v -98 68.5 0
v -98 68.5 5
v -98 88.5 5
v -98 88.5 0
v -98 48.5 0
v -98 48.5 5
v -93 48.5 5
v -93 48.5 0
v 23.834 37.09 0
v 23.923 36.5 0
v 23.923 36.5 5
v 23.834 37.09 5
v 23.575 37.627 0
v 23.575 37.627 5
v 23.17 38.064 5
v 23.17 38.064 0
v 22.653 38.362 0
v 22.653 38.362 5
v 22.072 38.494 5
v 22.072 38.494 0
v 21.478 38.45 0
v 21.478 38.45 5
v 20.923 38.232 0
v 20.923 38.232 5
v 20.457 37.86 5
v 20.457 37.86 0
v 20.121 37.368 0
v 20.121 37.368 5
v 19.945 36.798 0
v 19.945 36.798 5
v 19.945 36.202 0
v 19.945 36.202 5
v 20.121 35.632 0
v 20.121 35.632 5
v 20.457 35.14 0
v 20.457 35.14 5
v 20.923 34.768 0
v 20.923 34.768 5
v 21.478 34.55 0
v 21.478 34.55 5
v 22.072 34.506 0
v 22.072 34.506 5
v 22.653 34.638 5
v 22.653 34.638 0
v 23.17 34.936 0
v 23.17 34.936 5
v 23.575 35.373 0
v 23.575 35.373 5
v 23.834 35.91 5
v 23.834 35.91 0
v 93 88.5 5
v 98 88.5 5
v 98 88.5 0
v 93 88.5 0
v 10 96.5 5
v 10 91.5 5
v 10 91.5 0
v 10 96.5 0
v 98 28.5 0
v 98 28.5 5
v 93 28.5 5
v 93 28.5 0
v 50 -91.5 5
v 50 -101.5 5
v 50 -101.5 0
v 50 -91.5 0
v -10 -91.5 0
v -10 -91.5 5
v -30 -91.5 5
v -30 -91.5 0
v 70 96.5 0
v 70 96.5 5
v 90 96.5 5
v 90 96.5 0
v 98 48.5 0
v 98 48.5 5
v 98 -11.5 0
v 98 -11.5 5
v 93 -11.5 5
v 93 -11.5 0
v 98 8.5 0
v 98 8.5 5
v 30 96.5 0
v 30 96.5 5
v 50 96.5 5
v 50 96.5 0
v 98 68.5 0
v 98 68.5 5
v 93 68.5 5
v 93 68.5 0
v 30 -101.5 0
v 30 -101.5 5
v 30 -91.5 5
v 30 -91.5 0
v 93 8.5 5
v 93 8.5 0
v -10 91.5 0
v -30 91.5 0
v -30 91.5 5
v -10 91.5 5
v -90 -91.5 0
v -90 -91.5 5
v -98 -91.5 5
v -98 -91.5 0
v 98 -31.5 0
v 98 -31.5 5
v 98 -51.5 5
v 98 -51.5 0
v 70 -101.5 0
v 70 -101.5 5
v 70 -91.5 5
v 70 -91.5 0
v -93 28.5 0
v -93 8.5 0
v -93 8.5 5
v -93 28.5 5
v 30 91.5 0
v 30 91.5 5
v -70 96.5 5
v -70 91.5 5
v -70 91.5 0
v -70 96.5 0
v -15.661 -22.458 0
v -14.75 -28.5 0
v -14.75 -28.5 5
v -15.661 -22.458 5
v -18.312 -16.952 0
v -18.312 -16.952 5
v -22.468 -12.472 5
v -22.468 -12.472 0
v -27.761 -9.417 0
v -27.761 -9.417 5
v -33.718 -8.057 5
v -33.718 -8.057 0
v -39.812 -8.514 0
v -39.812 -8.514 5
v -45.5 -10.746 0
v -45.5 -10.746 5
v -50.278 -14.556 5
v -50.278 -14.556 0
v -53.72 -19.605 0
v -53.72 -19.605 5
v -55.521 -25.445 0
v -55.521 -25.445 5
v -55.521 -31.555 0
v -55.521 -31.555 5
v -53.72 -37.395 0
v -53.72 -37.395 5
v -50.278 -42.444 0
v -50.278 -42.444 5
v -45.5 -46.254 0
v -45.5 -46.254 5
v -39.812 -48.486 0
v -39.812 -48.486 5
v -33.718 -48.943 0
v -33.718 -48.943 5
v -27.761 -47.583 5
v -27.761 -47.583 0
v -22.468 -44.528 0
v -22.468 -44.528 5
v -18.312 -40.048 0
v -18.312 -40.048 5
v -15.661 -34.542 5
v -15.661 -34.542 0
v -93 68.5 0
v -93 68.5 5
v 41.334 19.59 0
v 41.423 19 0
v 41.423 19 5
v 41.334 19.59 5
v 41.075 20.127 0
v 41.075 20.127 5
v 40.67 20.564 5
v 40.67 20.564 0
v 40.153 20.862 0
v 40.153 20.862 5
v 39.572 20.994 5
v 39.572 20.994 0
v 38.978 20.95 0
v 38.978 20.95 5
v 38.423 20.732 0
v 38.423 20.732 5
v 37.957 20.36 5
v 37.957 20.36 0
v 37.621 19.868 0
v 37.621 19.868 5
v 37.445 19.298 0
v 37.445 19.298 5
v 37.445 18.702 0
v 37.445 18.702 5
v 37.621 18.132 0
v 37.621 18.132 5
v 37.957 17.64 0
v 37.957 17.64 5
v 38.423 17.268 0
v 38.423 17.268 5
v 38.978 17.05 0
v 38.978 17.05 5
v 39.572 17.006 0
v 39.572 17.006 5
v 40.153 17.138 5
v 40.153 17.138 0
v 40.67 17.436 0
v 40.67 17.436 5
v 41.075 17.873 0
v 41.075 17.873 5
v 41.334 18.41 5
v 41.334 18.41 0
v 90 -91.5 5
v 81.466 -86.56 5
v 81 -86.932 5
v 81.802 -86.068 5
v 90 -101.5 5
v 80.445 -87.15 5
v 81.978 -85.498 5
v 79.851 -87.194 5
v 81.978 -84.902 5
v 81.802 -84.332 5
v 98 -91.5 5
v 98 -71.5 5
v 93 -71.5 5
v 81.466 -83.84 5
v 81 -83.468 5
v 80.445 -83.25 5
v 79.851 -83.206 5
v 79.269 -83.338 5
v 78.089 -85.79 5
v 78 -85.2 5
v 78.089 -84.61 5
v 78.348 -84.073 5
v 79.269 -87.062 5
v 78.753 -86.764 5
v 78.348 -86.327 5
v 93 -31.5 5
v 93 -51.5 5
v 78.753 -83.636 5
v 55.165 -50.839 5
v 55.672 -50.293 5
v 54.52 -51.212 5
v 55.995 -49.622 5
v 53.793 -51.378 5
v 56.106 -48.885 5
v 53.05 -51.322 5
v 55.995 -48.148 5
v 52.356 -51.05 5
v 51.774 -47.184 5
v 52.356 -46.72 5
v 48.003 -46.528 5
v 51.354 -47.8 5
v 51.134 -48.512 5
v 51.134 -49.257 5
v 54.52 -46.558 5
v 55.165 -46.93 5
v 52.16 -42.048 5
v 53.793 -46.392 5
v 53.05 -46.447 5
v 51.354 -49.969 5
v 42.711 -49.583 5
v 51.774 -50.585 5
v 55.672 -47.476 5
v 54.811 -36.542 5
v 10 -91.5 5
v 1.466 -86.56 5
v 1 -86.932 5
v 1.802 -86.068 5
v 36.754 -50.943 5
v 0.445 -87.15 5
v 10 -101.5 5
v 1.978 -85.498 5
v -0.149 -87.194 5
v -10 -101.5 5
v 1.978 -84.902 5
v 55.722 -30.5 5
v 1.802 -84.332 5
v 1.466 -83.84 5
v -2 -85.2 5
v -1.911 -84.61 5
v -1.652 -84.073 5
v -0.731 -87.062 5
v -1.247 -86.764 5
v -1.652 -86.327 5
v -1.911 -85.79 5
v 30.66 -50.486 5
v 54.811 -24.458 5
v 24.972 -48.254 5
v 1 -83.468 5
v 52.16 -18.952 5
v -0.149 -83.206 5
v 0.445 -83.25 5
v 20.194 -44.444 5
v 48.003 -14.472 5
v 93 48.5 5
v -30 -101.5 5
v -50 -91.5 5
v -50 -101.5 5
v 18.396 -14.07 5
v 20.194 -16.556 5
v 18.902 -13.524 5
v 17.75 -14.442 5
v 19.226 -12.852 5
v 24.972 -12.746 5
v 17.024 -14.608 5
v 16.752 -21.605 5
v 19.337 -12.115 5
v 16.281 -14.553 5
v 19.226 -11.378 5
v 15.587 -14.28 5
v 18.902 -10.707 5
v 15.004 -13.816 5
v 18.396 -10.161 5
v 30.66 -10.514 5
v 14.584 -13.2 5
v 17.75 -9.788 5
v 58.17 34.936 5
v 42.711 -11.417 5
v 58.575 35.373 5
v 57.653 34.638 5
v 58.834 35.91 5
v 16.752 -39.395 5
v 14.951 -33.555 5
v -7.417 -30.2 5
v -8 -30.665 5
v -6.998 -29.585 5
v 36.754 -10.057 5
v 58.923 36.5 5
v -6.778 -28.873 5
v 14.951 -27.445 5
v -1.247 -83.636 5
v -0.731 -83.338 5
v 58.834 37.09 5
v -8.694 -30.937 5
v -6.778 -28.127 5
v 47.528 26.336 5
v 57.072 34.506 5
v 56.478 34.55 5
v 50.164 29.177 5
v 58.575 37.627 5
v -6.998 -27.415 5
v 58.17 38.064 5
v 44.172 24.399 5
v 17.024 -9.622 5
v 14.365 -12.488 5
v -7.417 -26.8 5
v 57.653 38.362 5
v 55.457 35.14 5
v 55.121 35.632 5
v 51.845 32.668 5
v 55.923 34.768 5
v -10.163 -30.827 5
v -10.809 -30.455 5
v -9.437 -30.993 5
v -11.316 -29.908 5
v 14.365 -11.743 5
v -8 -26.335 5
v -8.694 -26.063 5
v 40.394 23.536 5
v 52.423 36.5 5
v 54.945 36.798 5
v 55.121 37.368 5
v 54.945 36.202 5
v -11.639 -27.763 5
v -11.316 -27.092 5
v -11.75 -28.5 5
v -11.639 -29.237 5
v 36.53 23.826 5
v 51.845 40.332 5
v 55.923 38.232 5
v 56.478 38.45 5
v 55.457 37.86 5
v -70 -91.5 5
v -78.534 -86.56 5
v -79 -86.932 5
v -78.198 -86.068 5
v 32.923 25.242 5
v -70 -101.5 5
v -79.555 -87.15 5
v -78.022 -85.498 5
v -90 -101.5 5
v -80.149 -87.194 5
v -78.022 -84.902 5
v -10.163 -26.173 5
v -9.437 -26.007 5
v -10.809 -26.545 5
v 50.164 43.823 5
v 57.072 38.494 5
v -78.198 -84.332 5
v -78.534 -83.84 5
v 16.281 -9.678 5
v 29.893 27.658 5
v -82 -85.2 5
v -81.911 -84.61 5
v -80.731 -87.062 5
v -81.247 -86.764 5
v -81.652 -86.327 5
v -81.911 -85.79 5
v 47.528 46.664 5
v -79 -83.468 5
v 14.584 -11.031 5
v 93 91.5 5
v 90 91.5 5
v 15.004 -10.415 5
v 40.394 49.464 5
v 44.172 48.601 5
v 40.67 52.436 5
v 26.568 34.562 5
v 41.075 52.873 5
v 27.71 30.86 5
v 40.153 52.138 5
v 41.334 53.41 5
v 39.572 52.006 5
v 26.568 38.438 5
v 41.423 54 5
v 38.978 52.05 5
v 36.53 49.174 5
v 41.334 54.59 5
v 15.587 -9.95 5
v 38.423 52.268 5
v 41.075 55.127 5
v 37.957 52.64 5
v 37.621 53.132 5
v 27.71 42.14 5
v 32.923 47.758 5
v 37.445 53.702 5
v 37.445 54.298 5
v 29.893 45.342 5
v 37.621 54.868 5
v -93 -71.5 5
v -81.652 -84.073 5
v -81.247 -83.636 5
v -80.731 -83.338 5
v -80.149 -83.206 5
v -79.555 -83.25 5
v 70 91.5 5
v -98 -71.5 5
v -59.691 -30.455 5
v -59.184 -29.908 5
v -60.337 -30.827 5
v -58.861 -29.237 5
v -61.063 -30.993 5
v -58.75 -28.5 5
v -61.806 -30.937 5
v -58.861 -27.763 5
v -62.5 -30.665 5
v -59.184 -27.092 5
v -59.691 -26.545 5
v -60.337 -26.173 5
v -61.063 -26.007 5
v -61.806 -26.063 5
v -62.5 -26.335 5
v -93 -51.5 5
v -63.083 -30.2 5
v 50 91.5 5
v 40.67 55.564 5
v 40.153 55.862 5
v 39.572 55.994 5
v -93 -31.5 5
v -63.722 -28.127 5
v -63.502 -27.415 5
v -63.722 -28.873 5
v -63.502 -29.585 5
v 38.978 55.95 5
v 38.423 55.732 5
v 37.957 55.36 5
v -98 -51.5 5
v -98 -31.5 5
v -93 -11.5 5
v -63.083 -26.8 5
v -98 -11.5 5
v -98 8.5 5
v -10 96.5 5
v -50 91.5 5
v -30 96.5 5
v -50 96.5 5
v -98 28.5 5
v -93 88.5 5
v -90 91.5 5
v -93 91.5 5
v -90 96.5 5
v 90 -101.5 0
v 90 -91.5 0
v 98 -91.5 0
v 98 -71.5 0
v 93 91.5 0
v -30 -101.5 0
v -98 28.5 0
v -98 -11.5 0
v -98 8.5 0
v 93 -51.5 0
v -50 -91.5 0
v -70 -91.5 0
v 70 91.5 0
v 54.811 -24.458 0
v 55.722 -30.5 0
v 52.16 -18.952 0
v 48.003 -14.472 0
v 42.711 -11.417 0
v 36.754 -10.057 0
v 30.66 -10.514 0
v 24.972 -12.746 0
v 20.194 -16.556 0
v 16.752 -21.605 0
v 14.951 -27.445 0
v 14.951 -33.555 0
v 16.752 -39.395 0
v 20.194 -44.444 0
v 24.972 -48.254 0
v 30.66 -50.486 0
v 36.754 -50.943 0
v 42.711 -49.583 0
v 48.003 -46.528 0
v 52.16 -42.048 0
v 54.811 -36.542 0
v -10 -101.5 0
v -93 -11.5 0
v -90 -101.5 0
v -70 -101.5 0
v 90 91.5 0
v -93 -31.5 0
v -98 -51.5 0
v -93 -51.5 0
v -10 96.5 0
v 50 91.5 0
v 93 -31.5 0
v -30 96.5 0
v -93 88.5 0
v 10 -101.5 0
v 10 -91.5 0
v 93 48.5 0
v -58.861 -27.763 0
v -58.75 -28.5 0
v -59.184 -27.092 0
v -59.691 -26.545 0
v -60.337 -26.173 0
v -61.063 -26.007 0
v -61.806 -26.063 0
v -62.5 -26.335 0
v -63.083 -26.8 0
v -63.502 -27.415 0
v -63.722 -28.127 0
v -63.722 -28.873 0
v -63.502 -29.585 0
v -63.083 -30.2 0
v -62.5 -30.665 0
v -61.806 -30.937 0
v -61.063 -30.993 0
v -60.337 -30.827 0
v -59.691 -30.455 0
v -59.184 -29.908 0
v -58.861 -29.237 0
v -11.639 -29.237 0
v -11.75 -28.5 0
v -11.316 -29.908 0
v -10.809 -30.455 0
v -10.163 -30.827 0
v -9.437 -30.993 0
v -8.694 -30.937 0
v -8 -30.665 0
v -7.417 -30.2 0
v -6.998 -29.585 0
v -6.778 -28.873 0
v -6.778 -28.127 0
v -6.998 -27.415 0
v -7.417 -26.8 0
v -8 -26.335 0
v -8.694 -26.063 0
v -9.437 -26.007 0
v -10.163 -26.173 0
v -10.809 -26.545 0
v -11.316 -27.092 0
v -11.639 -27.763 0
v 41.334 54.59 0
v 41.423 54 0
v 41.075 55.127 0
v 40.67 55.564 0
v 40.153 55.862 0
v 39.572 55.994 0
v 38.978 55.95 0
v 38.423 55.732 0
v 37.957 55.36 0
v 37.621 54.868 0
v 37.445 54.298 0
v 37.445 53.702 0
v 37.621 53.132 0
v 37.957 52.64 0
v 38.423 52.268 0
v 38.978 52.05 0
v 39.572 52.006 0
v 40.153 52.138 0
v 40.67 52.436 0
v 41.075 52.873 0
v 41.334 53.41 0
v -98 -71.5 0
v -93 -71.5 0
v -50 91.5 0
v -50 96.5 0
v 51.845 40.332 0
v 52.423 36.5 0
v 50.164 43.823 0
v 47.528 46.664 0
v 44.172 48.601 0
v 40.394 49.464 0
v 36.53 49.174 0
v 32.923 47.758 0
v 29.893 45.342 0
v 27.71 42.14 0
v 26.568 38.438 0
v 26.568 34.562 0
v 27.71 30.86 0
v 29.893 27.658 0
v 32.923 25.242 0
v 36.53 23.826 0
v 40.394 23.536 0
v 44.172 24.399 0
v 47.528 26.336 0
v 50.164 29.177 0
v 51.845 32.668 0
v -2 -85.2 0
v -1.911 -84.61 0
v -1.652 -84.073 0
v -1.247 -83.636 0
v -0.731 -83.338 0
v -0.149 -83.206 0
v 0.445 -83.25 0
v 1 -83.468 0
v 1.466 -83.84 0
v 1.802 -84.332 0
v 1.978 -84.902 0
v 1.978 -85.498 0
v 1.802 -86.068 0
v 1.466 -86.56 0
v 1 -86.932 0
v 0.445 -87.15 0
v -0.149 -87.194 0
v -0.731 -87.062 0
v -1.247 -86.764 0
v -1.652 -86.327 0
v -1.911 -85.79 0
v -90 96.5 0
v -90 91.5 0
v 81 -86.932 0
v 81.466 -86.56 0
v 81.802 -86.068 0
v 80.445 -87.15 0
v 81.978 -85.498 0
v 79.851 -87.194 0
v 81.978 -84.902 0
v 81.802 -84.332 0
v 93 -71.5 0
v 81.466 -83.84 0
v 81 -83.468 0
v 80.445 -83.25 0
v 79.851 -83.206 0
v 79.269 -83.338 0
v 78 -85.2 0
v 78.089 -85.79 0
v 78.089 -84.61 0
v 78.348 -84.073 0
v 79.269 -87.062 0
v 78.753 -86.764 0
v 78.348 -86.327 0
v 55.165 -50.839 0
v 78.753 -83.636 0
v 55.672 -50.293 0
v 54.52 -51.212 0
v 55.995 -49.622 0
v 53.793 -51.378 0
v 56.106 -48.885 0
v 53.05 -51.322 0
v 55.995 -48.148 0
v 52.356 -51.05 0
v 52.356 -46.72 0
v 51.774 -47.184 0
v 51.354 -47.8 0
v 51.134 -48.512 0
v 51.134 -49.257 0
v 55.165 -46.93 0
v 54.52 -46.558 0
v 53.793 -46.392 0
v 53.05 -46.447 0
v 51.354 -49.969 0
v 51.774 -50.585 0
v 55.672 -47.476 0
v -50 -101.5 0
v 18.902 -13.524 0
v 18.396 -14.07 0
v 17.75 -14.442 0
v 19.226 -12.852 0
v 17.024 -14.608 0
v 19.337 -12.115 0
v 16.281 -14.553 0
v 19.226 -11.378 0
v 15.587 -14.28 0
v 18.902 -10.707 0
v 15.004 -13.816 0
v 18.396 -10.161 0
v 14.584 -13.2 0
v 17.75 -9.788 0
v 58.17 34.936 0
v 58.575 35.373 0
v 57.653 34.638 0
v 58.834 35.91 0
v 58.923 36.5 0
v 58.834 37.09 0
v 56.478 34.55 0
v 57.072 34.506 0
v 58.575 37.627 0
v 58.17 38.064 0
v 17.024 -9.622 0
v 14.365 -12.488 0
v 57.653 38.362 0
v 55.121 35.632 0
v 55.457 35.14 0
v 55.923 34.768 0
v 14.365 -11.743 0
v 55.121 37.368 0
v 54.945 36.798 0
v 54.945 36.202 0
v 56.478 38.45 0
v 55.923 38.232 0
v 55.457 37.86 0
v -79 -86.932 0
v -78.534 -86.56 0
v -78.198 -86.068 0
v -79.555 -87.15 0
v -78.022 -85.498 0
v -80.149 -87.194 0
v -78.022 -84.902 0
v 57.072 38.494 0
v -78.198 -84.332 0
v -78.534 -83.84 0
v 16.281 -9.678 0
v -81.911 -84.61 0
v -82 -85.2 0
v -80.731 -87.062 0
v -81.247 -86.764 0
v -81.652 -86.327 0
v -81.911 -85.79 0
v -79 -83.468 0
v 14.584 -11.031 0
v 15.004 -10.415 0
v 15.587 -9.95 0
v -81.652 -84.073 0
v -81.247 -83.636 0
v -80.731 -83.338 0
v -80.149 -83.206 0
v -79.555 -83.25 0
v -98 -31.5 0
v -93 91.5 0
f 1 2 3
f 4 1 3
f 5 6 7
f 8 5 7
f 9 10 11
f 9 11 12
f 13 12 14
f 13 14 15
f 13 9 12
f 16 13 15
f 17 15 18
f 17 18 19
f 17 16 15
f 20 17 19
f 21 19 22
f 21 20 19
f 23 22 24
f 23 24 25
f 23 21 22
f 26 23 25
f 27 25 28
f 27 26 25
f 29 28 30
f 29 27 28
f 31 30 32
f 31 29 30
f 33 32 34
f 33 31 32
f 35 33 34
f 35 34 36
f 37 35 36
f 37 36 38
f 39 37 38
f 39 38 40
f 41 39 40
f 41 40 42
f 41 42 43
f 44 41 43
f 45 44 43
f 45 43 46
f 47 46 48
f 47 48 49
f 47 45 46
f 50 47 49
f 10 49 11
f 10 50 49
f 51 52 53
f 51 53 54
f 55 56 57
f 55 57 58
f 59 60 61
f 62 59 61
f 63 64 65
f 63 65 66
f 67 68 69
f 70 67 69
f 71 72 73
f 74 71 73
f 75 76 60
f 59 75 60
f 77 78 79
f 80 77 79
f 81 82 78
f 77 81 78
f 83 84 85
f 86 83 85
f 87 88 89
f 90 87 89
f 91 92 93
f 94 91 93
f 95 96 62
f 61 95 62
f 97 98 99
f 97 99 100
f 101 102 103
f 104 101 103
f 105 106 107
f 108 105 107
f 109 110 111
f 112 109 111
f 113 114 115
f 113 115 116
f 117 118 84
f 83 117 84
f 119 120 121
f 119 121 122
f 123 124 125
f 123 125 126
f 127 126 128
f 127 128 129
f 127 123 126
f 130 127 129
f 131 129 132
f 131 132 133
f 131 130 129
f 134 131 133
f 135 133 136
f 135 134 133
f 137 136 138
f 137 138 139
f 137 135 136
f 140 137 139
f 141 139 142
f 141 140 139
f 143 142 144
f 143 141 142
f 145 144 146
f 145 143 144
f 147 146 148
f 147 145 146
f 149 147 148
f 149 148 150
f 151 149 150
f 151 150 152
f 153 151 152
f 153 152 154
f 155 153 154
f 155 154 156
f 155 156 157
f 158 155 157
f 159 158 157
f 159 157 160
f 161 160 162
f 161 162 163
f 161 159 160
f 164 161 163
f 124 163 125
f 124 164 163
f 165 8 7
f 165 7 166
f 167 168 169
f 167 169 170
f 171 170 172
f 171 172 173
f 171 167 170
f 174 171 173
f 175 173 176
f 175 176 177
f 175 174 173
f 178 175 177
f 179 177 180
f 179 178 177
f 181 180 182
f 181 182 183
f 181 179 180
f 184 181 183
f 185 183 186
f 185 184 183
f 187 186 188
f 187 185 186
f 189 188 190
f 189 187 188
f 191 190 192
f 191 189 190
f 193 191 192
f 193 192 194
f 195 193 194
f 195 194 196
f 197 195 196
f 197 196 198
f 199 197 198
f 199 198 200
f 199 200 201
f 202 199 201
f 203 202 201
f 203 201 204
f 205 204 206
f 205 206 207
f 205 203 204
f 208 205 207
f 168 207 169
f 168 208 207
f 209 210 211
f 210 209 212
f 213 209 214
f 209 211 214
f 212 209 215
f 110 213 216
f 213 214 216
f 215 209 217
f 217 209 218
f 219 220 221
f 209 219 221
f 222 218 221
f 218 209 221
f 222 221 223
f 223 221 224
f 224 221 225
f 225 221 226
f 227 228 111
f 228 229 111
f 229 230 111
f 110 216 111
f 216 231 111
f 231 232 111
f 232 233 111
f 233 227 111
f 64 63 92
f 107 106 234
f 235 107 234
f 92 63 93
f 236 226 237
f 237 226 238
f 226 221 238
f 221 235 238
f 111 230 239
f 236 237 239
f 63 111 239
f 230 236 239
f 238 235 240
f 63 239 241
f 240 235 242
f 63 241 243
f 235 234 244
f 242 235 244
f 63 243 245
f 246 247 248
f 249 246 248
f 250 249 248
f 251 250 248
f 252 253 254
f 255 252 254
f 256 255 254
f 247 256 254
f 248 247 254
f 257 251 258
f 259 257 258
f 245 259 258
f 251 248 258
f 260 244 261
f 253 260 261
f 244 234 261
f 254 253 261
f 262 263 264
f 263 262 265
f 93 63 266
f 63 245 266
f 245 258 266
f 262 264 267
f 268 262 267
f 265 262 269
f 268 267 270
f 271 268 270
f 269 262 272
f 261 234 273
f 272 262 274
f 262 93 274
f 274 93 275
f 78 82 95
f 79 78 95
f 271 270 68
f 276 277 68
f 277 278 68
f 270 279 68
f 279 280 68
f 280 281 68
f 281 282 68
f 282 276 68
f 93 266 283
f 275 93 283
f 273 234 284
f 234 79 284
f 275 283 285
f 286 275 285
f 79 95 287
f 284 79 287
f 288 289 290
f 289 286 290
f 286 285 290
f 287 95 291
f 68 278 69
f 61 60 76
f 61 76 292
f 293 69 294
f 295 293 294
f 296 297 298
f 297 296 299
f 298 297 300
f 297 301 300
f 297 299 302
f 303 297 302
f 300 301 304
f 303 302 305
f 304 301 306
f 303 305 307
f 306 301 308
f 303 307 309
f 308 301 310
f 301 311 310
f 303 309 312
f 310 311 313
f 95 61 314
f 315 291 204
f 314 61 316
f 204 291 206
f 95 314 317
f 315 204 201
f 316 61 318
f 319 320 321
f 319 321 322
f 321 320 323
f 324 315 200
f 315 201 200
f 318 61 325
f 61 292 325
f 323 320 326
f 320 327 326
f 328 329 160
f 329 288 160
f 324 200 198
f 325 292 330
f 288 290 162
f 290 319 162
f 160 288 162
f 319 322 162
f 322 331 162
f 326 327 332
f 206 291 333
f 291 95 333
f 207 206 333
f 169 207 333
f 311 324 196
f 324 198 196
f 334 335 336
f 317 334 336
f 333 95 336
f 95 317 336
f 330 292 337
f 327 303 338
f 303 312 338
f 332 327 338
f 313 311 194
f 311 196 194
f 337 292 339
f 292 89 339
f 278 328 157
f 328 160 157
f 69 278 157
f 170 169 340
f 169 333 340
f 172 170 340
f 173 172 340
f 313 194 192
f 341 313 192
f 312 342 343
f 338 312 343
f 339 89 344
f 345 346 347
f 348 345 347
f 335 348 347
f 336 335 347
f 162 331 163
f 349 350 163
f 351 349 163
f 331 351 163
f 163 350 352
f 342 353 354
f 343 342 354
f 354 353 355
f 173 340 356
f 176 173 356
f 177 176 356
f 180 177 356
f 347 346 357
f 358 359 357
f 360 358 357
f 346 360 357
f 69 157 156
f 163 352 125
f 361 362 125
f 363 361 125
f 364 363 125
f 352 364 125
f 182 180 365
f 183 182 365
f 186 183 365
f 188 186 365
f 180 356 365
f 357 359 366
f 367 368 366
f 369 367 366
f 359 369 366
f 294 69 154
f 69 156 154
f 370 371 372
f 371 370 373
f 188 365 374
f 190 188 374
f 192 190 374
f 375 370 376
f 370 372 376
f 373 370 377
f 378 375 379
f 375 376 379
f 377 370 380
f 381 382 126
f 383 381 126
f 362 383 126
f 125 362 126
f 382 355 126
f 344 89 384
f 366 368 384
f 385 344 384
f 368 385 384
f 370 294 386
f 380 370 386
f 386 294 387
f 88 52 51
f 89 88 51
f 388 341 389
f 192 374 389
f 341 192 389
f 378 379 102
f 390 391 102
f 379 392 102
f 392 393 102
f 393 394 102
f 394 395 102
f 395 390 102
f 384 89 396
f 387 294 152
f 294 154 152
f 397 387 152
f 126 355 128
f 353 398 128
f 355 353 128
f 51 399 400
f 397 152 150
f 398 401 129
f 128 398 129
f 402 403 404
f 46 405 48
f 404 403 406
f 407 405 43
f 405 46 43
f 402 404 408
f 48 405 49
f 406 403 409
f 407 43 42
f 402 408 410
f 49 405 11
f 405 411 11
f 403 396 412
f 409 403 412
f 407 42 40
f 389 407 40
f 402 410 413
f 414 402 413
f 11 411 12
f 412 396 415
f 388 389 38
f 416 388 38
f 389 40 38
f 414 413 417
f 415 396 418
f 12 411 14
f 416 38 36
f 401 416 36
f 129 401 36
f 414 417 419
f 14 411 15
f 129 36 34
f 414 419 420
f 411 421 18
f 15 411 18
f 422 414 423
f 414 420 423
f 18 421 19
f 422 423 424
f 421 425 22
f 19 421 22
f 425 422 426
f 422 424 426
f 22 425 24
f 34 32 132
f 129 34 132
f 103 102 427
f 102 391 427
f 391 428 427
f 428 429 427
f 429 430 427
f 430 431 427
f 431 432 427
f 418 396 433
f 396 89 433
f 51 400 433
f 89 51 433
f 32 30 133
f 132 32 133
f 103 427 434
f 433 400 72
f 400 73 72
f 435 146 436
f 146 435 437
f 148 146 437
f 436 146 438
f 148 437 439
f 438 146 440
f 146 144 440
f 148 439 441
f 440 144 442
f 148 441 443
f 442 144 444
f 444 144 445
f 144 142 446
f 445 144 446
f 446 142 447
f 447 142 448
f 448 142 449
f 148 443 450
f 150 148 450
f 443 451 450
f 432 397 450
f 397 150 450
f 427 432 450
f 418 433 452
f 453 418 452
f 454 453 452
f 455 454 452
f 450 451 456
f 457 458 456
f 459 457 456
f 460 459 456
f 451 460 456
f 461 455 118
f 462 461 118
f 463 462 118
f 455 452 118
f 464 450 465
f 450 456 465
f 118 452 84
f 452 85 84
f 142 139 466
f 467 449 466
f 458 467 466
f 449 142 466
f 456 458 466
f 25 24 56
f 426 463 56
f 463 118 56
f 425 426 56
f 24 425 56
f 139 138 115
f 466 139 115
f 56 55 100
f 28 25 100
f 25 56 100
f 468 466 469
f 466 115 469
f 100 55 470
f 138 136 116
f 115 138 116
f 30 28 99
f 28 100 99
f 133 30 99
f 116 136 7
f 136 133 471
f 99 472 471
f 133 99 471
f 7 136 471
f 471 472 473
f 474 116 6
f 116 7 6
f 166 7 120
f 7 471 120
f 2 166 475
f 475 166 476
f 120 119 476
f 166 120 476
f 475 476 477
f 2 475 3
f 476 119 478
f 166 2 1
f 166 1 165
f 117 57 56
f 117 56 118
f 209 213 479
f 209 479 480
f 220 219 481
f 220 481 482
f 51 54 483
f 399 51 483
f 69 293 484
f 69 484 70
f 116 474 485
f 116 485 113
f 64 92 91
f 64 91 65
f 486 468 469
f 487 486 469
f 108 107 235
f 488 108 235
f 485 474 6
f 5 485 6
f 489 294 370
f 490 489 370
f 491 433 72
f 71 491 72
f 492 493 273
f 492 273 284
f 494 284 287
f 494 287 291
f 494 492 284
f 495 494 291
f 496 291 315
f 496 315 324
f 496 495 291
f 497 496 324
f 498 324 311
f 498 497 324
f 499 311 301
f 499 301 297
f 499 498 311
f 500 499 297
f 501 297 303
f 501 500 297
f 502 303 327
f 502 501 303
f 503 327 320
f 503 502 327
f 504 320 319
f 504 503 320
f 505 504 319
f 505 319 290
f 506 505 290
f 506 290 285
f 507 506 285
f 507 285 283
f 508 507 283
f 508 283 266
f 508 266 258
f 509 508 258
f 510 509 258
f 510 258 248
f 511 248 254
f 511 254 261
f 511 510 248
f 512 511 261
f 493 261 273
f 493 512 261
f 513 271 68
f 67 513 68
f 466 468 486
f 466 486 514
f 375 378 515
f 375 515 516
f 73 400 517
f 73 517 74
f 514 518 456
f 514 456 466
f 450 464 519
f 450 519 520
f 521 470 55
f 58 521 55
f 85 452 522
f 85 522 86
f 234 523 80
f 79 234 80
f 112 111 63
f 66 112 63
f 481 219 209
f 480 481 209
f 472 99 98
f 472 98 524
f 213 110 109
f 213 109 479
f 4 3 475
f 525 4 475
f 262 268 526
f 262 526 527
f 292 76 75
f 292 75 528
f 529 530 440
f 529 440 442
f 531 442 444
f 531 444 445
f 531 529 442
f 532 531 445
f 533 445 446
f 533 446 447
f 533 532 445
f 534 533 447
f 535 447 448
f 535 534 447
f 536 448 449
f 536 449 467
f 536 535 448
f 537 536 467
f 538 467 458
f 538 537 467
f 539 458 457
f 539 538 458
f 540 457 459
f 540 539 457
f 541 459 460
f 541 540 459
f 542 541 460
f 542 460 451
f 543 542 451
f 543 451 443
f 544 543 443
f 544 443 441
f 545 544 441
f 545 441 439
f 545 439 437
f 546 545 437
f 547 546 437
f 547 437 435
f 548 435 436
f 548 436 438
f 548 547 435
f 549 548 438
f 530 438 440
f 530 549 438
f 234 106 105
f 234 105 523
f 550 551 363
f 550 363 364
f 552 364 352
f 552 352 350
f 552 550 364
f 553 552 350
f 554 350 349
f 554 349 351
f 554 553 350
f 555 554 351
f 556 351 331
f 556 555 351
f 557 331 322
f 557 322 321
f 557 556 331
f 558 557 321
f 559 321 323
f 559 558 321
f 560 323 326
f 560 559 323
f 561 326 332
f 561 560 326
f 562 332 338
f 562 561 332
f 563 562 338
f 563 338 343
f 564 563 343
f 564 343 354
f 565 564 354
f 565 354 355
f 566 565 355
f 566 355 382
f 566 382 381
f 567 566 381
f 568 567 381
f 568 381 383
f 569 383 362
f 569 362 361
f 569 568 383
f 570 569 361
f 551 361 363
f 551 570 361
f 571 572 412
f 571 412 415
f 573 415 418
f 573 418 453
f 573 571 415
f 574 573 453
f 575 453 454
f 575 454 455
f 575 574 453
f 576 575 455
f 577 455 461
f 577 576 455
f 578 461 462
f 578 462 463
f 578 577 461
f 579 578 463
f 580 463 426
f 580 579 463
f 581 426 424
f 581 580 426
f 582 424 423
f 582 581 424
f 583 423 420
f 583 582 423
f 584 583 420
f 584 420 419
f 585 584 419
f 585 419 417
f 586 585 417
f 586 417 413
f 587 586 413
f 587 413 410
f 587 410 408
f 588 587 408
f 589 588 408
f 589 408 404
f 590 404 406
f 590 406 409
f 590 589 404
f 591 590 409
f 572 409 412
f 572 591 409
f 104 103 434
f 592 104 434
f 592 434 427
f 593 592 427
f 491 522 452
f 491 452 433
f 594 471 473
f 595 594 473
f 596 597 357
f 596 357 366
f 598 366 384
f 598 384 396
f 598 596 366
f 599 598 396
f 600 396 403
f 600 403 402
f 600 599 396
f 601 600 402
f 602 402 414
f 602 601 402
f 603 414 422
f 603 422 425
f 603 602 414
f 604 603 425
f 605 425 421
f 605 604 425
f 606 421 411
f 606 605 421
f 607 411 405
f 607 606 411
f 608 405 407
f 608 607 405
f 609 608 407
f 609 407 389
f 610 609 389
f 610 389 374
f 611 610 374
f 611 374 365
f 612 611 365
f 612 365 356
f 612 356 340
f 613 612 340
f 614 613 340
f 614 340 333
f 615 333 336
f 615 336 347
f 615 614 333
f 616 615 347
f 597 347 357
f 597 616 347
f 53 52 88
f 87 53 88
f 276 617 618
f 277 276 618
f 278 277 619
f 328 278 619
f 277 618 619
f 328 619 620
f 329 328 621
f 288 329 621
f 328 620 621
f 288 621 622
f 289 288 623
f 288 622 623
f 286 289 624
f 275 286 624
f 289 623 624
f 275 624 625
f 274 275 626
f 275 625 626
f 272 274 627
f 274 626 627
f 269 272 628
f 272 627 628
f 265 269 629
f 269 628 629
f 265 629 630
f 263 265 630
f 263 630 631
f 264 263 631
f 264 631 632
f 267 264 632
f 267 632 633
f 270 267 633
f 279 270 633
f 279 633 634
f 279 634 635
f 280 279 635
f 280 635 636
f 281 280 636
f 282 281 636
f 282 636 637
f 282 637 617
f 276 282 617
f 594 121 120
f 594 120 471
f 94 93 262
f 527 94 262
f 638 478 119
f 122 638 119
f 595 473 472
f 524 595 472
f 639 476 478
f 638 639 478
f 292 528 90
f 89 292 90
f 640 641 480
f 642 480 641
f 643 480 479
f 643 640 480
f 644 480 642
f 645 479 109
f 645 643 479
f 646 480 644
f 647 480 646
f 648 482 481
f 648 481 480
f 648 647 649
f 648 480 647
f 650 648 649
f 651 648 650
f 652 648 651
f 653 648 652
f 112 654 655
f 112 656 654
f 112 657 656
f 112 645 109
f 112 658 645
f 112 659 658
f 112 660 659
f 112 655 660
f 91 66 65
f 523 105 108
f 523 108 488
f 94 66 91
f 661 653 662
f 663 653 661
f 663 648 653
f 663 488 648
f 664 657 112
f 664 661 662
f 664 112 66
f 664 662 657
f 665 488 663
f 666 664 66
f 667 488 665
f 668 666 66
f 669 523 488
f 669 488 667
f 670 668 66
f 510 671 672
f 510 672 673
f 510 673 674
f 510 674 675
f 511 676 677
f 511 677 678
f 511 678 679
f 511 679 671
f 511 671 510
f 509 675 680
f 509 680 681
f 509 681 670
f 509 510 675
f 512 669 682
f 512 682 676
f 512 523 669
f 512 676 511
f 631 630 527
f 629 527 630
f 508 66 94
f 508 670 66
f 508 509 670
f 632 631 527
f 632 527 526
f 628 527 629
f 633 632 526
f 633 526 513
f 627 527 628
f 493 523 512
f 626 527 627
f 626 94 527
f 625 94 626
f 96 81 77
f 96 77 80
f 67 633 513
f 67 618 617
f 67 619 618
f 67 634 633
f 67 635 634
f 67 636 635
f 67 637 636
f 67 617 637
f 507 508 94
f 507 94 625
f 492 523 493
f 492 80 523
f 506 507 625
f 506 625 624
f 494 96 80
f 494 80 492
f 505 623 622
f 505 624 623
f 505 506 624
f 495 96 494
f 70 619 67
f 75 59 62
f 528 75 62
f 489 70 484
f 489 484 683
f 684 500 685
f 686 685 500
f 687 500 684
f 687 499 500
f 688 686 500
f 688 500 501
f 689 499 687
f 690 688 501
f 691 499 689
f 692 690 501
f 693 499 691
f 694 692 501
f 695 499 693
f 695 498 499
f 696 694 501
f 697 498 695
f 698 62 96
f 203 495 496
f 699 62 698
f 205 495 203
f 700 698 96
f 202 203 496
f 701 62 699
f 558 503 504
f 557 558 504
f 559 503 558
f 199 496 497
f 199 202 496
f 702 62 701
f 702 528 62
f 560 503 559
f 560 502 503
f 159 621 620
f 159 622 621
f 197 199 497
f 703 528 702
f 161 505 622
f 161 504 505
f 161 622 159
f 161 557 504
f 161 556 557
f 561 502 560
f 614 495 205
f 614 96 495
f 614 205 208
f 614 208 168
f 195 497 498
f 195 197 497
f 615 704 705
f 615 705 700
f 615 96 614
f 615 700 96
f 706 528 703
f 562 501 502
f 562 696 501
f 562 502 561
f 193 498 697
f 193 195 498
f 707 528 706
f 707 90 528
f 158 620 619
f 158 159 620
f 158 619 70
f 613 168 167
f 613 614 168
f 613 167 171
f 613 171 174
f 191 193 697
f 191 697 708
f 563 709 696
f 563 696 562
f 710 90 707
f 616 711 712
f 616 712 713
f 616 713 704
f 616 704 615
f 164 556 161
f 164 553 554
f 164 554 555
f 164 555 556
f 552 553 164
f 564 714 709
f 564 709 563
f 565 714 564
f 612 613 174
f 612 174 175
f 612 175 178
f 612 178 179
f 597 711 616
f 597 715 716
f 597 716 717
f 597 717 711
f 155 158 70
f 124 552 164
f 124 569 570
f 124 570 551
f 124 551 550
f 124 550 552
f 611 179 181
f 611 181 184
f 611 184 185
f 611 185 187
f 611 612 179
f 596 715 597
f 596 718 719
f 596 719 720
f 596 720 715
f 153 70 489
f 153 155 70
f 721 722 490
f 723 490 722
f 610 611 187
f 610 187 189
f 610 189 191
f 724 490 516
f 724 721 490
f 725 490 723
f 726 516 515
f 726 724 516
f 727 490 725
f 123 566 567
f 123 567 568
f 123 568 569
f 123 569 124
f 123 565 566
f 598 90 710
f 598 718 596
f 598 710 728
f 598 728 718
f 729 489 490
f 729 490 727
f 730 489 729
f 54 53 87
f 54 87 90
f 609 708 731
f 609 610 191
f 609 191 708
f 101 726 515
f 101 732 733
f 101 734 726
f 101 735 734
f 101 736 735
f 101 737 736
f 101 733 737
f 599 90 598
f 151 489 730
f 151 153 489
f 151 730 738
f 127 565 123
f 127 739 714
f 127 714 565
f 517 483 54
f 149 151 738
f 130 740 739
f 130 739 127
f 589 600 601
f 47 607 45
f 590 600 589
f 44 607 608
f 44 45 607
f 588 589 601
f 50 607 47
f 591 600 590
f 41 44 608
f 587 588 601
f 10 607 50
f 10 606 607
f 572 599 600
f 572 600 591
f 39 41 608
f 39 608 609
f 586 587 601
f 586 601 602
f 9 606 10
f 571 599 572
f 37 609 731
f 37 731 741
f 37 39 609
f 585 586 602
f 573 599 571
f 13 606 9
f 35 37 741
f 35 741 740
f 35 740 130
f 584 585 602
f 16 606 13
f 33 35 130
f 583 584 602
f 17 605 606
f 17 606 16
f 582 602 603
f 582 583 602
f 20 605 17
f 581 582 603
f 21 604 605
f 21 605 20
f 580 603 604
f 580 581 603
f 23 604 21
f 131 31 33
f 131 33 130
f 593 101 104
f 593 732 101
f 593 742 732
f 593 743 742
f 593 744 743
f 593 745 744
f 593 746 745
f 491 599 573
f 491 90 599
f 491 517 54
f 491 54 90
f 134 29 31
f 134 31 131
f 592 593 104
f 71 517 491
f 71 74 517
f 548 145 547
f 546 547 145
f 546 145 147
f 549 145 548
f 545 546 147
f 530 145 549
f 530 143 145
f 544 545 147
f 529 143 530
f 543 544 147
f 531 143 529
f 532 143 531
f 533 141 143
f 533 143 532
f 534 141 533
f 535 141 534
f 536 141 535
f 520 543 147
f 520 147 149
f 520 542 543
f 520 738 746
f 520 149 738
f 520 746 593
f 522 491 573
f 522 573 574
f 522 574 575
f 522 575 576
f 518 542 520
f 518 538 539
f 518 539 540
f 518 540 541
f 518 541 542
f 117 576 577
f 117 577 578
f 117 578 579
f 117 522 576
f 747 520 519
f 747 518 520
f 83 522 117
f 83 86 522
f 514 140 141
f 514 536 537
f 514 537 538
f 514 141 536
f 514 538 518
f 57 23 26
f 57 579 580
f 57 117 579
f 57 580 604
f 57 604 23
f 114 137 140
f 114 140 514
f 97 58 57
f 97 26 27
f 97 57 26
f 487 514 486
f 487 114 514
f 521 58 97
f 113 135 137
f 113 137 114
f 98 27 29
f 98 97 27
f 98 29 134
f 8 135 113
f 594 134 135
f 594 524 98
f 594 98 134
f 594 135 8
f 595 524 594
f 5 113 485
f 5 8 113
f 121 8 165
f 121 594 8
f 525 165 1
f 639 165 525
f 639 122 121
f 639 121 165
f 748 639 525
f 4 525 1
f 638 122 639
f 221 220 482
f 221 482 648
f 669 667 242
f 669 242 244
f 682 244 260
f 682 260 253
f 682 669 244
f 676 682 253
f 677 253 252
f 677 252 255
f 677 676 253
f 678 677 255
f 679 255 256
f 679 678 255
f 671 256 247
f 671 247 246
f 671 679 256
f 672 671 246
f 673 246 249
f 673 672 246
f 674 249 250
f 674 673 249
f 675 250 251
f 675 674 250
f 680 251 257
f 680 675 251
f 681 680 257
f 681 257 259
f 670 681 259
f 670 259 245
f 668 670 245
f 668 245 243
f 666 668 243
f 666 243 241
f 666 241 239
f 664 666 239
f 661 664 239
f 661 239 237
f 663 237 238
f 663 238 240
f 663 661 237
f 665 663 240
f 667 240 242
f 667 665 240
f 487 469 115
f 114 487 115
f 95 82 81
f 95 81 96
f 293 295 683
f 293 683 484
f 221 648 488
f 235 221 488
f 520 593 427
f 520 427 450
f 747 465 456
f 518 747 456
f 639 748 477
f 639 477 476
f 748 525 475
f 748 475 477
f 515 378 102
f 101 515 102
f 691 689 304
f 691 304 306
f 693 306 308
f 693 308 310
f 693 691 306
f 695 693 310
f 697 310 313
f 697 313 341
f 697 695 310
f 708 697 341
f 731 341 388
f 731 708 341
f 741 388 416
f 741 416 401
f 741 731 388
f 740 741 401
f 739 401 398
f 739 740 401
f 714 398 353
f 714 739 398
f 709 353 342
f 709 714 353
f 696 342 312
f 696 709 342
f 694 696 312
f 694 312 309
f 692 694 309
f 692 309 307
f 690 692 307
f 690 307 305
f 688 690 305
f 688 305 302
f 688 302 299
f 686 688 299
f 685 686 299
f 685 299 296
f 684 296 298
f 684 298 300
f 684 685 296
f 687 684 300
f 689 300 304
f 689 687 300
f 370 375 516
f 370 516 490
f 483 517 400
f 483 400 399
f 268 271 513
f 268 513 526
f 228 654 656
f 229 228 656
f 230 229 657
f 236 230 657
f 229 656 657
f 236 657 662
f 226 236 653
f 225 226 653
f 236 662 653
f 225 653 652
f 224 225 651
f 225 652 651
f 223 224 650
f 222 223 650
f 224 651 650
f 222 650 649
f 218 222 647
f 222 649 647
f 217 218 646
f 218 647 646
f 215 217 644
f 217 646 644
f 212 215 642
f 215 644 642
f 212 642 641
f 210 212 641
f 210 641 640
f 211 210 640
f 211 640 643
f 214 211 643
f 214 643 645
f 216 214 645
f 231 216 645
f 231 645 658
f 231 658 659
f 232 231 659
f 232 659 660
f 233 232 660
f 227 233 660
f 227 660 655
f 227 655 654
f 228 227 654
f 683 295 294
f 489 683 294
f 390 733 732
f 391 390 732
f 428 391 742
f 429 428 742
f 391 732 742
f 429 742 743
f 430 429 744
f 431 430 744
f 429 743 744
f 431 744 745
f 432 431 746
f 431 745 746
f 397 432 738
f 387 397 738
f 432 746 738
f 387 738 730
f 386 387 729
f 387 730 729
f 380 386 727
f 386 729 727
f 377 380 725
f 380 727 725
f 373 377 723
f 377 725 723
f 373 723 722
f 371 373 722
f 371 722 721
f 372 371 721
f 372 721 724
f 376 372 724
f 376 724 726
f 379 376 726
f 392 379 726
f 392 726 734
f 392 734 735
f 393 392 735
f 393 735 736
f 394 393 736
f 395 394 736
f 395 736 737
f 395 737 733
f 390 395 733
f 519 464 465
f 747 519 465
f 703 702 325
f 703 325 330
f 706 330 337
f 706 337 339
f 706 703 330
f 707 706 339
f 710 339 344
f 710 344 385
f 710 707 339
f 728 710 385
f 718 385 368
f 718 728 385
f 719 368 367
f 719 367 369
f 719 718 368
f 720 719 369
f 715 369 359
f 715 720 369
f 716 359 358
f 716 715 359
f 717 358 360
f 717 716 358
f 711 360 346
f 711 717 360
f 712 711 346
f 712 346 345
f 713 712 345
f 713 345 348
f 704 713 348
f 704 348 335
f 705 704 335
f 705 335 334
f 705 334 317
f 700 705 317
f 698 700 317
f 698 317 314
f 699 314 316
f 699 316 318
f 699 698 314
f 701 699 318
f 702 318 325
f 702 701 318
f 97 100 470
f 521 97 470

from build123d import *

# Parameters (mm, degrees)
SKETCH_1_W                       = 186
SKETCH_1_H                       = 183
SKETCH_1_R                       = 20.5
SKETCH_1_R_2                     = 2.5
SKETCH_1_R_3                     = 2
SKETCH_1_R_4                     = 13
EXTRUDE_1_DEPTH                  = 5
SKETCH_2_W                       = 5
SKETCH_2_H                       = 20
EXTRUDE_2_DEPTH                  = 5
PATTERN_LINEAR_1_COUNT           = 5
PATTERN_LINEAR_1_PITCH           = 40
MIRROR_1_COPY_1_SKETCH_W         = 5
MIRROR_1_COPY_1_SKETCH_H         = 20
MIRROR_1_COPY_1_DEPTH            = 5
MIRROR_1_COPY_2_SKETCH_W         = 5
MIRROR_1_COPY_2_SKETCH_H         = 20
MIRROR_1_COPY_2_DEPTH            = 5
MIRROR_1_COPY_3_SKETCH_W         = 5
MIRROR_1_COPY_3_SKETCH_H         = 20
MIRROR_1_COPY_3_DEPTH            = 5
MIRROR_1_COPY_4_SKETCH_W         = 5
MIRROR_1_COPY_4_SKETCH_H         = 20
MIRROR_1_COPY_4_DEPTH            = 5
SKETCH_3_W                       = 20
SKETCH_3_H                       = 5
EXTRUDE_3_DEPTH                  = 5
PATTERN_LINEAR_2_COUNT           = 3
PATTERN_LINEAR_2_PITCH           = 40
PATTERN_LINEAR_3_COUNT           = 3
PATTERN_LINEAR_3_PITCH           = 40
SKETCH_4_W                       = 20
SKETCH_4_H                       = 10
EXTRUDE_4_DEPTH                  = 5
PATTERN_LINEAR_4_COUNT           = 3
PATTERN_LINEAR_4_PITCH           = 40
PATTERN_LINEAR_5_COPY_1_SKETCH_W = 20
PATTERN_LINEAR_5_COPY_1_SKETCH_H = 10
PATTERN_LINEAR_5_COPY_1_DEPTH    = 5
PATTERN_LINEAR_5_COPY_2_SKETCH_W = 20
PATTERN_LINEAR_5_COPY_2_SKETCH_H = 10
PATTERN_LINEAR_5_COPY_2_DEPTH    = 5
PATTERN_LINEAR_5_COPY_3_SKETCH_W = 20
PATTERN_LINEAR_5_COPY_3_SKETCH_H = 10
PATTERN_LINEAR_5_COPY_3_DEPTH    = 5
PATTERN_LINEAR_5_COPY_4_SKETCH_W = 20
PATTERN_LINEAR_5_COPY_4_SKETCH_H = 10
PATTERN_LINEAR_5_COPY_4_DEPTH    = 5
PATTERN_LINEAR_5_COPY_5_SKETCH_W = 20
PATTERN_LINEAR_5_COPY_5_SKETCH_H = 10
PATTERN_LINEAR_5_COPY_5_DEPTH    = 5
PATTERN_LINEAR_5_COPY_6_SKETCH_W = 20
PATTERN_LINEAR_5_COPY_6_SKETCH_H = 10
PATTERN_LINEAR_5_COPY_6_DEPTH    = 5
CUT_EXTRUDE_1_REACH              = 143.178
SKETCH_5_R                       = 2
PATTERN_LINEAR_6_COUNT           = 2
PATTERN_LINEAR_6_PITCH           = 80
PATTERN_LINEAR_7_COUNT           = 2
PATTERN_LINEAR_7_PITCH           = 80


with BuildPart() as part:
    # 스케치1 → 보스-돌출1 (new body)
    with BuildSketch(Plane.XY):
        Rectangle(SKETCH_1_W, SKETCH_1_H)
        with Locations((-35.25, -28.5)):
            Circle(SKETCH_1_R, mode=Mode.SUBTRACT)
        with Locations((-61.25, -28.5)):
            Circle(SKETCH_1_R_2, mode=Mode.SUBTRACT)
        with Locations(Location((-9.25, -28.5, 0), (0, 0, 180))):
            Circle(SKETCH_1_R_2, mode=Mode.SUBTRACT)
        with Locations((35.221625496, -30.5)):
            Circle(SKETCH_1_R, mode=Mode.SUBTRACT)
        with Locations((16.836849185, -12.115223689)):
            Circle(SKETCH_1_R_2, mode=Mode.SUBTRACT)
        with Locations((53.606401807, -48.884776311)):
            Circle(SKETCH_1_R_2, mode=Mode.SUBTRACT)
        with Locations((39.42261881, 19)):
            Circle(SKETCH_1_R_3, mode=Mode.SUBTRACT)
        with Locations((39.42261881, 36.5)):
            Circle(SKETCH_1_R_4, mode=Mode.SUBTRACT)
        with Locations((21.92261881, 36.5)):
            Circle(SKETCH_1_R_3, mode=Mode.SUBTRACT)
        with Locations((39.42261881, 54)):
            Circle(SKETCH_1_R_3, mode=Mode.SUBTRACT)
        with Locations((56.92261881, 36.5)):
            Circle(SKETCH_1_R_3, mode=Mode.SUBTRACT)
    extrude(amount=EXTRUDE_1_DEPTH)

    # 스케치2 → 보스-돌출2 (add)
    with BuildSketch(Plane.XY.offset(5)):
        with Locations((-95.5, -81.5)):
            Rectangle(SKETCH_2_W, SKETCH_2_H)
    extrude_2 = extrude(amount=-EXTRUDE_2_DEPTH)

    # 선형 패턴1: 보스-돌출2 ×5
    with Locations(*[(0, i * PATTERN_LINEAR_1_PITCH, 0) for i in range(1, PATTERN_LINEAR_1_COUNT)]):
        add(extrude_2)

    # 대칭 복사1: 보스-돌출2 across plane
    add(extrude_2.mirror(Plane(origin=(0, 0, 0), x_dir=(0, 0, 1), z_dir=(1, 0, 0))))

    # 대칭 복사1 copy 1 sketch → 대칭 복사1 copy 1 (add)
    with BuildSketch(Plane(origin=(0, 40, 5), x_dir=(-1, 0, 0), z_dir=(0, 0, 1))):
        with Locations((-95.5, 81.5)):
            Rectangle(MIRROR_1_COPY_1_SKETCH_W, MIRROR_1_COPY_1_SKETCH_H)
    extrude(amount=-MIRROR_1_COPY_1_DEPTH)

    # 대칭 복사1 copy 2 sketch → 대칭 복사1 copy 2 (add)
    with BuildSketch(Plane(origin=(0, 80, 5), x_dir=(-1, 0, 0), z_dir=(0, 0, 1))):
        with Locations((-95.5, 81.5)):
            Rectangle(MIRROR_1_COPY_2_SKETCH_W, MIRROR_1_COPY_2_SKETCH_H)
    extrude(amount=-MIRROR_1_COPY_2_DEPTH)

    # 대칭 복사1 copy 3 sketch → 대칭 복사1 copy 3 (add)
    with BuildSketch(Plane(origin=(0, 120, 5), x_dir=(-1, 0, 0), z_dir=(0, 0, 1))):
        with Locations((-95.5, 81.5)):
            Rectangle(MIRROR_1_COPY_3_SKETCH_W, MIRROR_1_COPY_3_SKETCH_H)
    extrude(amount=-MIRROR_1_COPY_3_DEPTH)

    # 대칭 복사1 copy 4 sketch → 대칭 복사1 copy 4 (add)
    with BuildSketch(Plane(origin=(0, 160, 5), x_dir=(-1, 0, 0), z_dir=(0, 0, 1))):
        with Locations((-95.5, 81.5)):
            Rectangle(MIRROR_1_COPY_4_SKETCH_W, MIRROR_1_COPY_4_SKETCH_H)
    extrude(amount=-MIRROR_1_COPY_4_DEPTH)

    # 스케치3 → 보스-돌출3 (add)
    with BuildSketch(Plane.XY.offset(5)):
        with Locations((0, 94)):
            Rectangle(SKETCH_3_W, SKETCH_3_H)
    extrude_3 = extrude(amount=-EXTRUDE_3_DEPTH)

    # 선형 패턴2: 보스-돌출3 ×3
    with Locations(*[(i * PATTERN_LINEAR_2_PITCH, 0, 0) for i in range(1, PATTERN_LINEAR_2_COUNT)]):
        add(extrude_3)

    # 선형 패턴3: 보스-돌출3 ×3
    with Locations(*[(-i * PATTERN_LINEAR_3_PITCH, 0, 0) for i in range(1, PATTERN_LINEAR_3_COUNT)]):
        add(extrude_3)

    # 스케치4 → 보스-돌출4 (add)
    with BuildSketch(Plane.XY.offset(5)):
        with Locations((0, -96.5)):
            Rectangle(SKETCH_4_W, SKETCH_4_H)
    extrude_4 = extrude(amount=-EXTRUDE_4_DEPTH)

    # 선형 패턴4: 보스-돌출4 ×3
    with Locations(*[(i * PATTERN_LINEAR_4_PITCH, 0, 0) for i in range(1, PATTERN_LINEAR_4_COUNT)]):
        add(extrude_4)

    # 선형 패턴5 copy 1 sketch → 선형 패턴5 copy 1 (add)
    with BuildSketch(Plane.XY.offset(5)):
        with Locations((0, -96.5)):
            Rectangle(PATTERN_LINEAR_5_COPY_1_SKETCH_W, PATTERN_LINEAR_5_COPY_1_SKETCH_H)
    extrude(amount=-PATTERN_LINEAR_5_COPY_1_DEPTH)

    # 선형 패턴5 copy 2 sketch → 선형 패턴5 copy 2 (add)
    with BuildSketch(Plane(origin=(-40, 0, 5), x_dir=(1, 0, 0), z_dir=(0, 0, 1))):
        with Locations((0, -96.5)):
            Rectangle(PATTERN_LINEAR_5_COPY_2_SKETCH_W, PATTERN_LINEAR_5_COPY_2_SKETCH_H)
    extrude(amount=-PATTERN_LINEAR_5_COPY_2_DEPTH)

    # 선형 패턴5 copy 3 sketch → 선형 패턴5 copy 3 (add)
    with BuildSketch(Plane(origin=(40, 0, 5), x_dir=(1, 0, 0), z_dir=(0, 0, 1))):
        with Locations((0, -96.5)):
            Rectangle(PATTERN_LINEAR_5_COPY_3_SKETCH_W, PATTERN_LINEAR_5_COPY_3_SKETCH_H)
    extrude(amount=-PATTERN_LINEAR_5_COPY_3_DEPTH)

    # 선형 패턴5 copy 4 sketch → 선형 패턴5 copy 4 (add)
    with BuildSketch(Plane.XY.offset(5)):
        with Locations((0, -96.5)):
            Rectangle(PATTERN_LINEAR_5_COPY_4_SKETCH_W, PATTERN_LINEAR_5_COPY_4_SKETCH_H)
    extrude(amount=-PATTERN_LINEAR_5_COPY_4_DEPTH)

    # 선형 패턴5 copy 5 sketch → 선형 패턴5 copy 5 (add)
    with BuildSketch(Plane(origin=(-40, 0, 5), x_dir=(1, 0, 0), z_dir=(0, 0, 1))):
        with Locations((0, -96.5)):
            Rectangle(PATTERN_LINEAR_5_COPY_5_SKETCH_W, PATTERN_LINEAR_5_COPY_5_SKETCH_H)
    extrude(amount=-PATTERN_LINEAR_5_COPY_5_DEPTH)

    # 선형 패턴5 copy 6 sketch → 선형 패턴5 copy 6 (add)
    with BuildSketch(Plane(origin=(-80, 0, 5), x_dir=(1, 0, 0), z_dir=(0, 0, 1))):
        with Locations((0, -96.5)):
            Rectangle(PATTERN_LINEAR_5_COPY_6_SKETCH_W, PATTERN_LINEAR_5_COPY_6_SKETCH_H)
    extrude(amount=-PATTERN_LINEAR_5_COPY_6_DEPTH)

    # 스케치5 → 컷-돌출1 (cut, up to next)
    with BuildSketch(Plane(origin=(0, 0, 0), x_dir=(-1, 0, 0), z_dir=(0, 0, -1)), mode=Mode.PRIVATE) as cut_extrude_1_sk1:
        with Locations((0, -85.2)):
            Circle(SKETCH_5_R)
    cut_extrude_1_tool1 = extrude(cut_extrude_1_sk1.sketch, amount=-CUT_EXTRUDE_1_REACH, mode=Mode.PRIVATE) & part.part
    cut_extrude_1 = cut_extrude_1_tool1.solids().sort_by_distance((0, -85.2, 0))[0]
    add(cut_extrude_1, mode=Mode.SUBTRACT)

    # 선형 패턴6: 컷-돌출1 ×2
    with Locations(*[(i * PATTERN_LINEAR_6_PITCH, 0, 0) for i in range(1, PATTERN_LINEAR_6_COUNT)]):
        add(cut_extrude_1, mode=Mode.SUBTRACT)

    # 선형 패턴7: 컷-돌출1 ×2
    with Locations(*[(-i * PATTERN_LINEAR_7_PITCH, 0, 0) for i in range(1, PATTERN_LINEAR_7_COUNT)]):
        add(cut_extrude_1, mode=Mode.SUBTRACT)


solid = part.part
